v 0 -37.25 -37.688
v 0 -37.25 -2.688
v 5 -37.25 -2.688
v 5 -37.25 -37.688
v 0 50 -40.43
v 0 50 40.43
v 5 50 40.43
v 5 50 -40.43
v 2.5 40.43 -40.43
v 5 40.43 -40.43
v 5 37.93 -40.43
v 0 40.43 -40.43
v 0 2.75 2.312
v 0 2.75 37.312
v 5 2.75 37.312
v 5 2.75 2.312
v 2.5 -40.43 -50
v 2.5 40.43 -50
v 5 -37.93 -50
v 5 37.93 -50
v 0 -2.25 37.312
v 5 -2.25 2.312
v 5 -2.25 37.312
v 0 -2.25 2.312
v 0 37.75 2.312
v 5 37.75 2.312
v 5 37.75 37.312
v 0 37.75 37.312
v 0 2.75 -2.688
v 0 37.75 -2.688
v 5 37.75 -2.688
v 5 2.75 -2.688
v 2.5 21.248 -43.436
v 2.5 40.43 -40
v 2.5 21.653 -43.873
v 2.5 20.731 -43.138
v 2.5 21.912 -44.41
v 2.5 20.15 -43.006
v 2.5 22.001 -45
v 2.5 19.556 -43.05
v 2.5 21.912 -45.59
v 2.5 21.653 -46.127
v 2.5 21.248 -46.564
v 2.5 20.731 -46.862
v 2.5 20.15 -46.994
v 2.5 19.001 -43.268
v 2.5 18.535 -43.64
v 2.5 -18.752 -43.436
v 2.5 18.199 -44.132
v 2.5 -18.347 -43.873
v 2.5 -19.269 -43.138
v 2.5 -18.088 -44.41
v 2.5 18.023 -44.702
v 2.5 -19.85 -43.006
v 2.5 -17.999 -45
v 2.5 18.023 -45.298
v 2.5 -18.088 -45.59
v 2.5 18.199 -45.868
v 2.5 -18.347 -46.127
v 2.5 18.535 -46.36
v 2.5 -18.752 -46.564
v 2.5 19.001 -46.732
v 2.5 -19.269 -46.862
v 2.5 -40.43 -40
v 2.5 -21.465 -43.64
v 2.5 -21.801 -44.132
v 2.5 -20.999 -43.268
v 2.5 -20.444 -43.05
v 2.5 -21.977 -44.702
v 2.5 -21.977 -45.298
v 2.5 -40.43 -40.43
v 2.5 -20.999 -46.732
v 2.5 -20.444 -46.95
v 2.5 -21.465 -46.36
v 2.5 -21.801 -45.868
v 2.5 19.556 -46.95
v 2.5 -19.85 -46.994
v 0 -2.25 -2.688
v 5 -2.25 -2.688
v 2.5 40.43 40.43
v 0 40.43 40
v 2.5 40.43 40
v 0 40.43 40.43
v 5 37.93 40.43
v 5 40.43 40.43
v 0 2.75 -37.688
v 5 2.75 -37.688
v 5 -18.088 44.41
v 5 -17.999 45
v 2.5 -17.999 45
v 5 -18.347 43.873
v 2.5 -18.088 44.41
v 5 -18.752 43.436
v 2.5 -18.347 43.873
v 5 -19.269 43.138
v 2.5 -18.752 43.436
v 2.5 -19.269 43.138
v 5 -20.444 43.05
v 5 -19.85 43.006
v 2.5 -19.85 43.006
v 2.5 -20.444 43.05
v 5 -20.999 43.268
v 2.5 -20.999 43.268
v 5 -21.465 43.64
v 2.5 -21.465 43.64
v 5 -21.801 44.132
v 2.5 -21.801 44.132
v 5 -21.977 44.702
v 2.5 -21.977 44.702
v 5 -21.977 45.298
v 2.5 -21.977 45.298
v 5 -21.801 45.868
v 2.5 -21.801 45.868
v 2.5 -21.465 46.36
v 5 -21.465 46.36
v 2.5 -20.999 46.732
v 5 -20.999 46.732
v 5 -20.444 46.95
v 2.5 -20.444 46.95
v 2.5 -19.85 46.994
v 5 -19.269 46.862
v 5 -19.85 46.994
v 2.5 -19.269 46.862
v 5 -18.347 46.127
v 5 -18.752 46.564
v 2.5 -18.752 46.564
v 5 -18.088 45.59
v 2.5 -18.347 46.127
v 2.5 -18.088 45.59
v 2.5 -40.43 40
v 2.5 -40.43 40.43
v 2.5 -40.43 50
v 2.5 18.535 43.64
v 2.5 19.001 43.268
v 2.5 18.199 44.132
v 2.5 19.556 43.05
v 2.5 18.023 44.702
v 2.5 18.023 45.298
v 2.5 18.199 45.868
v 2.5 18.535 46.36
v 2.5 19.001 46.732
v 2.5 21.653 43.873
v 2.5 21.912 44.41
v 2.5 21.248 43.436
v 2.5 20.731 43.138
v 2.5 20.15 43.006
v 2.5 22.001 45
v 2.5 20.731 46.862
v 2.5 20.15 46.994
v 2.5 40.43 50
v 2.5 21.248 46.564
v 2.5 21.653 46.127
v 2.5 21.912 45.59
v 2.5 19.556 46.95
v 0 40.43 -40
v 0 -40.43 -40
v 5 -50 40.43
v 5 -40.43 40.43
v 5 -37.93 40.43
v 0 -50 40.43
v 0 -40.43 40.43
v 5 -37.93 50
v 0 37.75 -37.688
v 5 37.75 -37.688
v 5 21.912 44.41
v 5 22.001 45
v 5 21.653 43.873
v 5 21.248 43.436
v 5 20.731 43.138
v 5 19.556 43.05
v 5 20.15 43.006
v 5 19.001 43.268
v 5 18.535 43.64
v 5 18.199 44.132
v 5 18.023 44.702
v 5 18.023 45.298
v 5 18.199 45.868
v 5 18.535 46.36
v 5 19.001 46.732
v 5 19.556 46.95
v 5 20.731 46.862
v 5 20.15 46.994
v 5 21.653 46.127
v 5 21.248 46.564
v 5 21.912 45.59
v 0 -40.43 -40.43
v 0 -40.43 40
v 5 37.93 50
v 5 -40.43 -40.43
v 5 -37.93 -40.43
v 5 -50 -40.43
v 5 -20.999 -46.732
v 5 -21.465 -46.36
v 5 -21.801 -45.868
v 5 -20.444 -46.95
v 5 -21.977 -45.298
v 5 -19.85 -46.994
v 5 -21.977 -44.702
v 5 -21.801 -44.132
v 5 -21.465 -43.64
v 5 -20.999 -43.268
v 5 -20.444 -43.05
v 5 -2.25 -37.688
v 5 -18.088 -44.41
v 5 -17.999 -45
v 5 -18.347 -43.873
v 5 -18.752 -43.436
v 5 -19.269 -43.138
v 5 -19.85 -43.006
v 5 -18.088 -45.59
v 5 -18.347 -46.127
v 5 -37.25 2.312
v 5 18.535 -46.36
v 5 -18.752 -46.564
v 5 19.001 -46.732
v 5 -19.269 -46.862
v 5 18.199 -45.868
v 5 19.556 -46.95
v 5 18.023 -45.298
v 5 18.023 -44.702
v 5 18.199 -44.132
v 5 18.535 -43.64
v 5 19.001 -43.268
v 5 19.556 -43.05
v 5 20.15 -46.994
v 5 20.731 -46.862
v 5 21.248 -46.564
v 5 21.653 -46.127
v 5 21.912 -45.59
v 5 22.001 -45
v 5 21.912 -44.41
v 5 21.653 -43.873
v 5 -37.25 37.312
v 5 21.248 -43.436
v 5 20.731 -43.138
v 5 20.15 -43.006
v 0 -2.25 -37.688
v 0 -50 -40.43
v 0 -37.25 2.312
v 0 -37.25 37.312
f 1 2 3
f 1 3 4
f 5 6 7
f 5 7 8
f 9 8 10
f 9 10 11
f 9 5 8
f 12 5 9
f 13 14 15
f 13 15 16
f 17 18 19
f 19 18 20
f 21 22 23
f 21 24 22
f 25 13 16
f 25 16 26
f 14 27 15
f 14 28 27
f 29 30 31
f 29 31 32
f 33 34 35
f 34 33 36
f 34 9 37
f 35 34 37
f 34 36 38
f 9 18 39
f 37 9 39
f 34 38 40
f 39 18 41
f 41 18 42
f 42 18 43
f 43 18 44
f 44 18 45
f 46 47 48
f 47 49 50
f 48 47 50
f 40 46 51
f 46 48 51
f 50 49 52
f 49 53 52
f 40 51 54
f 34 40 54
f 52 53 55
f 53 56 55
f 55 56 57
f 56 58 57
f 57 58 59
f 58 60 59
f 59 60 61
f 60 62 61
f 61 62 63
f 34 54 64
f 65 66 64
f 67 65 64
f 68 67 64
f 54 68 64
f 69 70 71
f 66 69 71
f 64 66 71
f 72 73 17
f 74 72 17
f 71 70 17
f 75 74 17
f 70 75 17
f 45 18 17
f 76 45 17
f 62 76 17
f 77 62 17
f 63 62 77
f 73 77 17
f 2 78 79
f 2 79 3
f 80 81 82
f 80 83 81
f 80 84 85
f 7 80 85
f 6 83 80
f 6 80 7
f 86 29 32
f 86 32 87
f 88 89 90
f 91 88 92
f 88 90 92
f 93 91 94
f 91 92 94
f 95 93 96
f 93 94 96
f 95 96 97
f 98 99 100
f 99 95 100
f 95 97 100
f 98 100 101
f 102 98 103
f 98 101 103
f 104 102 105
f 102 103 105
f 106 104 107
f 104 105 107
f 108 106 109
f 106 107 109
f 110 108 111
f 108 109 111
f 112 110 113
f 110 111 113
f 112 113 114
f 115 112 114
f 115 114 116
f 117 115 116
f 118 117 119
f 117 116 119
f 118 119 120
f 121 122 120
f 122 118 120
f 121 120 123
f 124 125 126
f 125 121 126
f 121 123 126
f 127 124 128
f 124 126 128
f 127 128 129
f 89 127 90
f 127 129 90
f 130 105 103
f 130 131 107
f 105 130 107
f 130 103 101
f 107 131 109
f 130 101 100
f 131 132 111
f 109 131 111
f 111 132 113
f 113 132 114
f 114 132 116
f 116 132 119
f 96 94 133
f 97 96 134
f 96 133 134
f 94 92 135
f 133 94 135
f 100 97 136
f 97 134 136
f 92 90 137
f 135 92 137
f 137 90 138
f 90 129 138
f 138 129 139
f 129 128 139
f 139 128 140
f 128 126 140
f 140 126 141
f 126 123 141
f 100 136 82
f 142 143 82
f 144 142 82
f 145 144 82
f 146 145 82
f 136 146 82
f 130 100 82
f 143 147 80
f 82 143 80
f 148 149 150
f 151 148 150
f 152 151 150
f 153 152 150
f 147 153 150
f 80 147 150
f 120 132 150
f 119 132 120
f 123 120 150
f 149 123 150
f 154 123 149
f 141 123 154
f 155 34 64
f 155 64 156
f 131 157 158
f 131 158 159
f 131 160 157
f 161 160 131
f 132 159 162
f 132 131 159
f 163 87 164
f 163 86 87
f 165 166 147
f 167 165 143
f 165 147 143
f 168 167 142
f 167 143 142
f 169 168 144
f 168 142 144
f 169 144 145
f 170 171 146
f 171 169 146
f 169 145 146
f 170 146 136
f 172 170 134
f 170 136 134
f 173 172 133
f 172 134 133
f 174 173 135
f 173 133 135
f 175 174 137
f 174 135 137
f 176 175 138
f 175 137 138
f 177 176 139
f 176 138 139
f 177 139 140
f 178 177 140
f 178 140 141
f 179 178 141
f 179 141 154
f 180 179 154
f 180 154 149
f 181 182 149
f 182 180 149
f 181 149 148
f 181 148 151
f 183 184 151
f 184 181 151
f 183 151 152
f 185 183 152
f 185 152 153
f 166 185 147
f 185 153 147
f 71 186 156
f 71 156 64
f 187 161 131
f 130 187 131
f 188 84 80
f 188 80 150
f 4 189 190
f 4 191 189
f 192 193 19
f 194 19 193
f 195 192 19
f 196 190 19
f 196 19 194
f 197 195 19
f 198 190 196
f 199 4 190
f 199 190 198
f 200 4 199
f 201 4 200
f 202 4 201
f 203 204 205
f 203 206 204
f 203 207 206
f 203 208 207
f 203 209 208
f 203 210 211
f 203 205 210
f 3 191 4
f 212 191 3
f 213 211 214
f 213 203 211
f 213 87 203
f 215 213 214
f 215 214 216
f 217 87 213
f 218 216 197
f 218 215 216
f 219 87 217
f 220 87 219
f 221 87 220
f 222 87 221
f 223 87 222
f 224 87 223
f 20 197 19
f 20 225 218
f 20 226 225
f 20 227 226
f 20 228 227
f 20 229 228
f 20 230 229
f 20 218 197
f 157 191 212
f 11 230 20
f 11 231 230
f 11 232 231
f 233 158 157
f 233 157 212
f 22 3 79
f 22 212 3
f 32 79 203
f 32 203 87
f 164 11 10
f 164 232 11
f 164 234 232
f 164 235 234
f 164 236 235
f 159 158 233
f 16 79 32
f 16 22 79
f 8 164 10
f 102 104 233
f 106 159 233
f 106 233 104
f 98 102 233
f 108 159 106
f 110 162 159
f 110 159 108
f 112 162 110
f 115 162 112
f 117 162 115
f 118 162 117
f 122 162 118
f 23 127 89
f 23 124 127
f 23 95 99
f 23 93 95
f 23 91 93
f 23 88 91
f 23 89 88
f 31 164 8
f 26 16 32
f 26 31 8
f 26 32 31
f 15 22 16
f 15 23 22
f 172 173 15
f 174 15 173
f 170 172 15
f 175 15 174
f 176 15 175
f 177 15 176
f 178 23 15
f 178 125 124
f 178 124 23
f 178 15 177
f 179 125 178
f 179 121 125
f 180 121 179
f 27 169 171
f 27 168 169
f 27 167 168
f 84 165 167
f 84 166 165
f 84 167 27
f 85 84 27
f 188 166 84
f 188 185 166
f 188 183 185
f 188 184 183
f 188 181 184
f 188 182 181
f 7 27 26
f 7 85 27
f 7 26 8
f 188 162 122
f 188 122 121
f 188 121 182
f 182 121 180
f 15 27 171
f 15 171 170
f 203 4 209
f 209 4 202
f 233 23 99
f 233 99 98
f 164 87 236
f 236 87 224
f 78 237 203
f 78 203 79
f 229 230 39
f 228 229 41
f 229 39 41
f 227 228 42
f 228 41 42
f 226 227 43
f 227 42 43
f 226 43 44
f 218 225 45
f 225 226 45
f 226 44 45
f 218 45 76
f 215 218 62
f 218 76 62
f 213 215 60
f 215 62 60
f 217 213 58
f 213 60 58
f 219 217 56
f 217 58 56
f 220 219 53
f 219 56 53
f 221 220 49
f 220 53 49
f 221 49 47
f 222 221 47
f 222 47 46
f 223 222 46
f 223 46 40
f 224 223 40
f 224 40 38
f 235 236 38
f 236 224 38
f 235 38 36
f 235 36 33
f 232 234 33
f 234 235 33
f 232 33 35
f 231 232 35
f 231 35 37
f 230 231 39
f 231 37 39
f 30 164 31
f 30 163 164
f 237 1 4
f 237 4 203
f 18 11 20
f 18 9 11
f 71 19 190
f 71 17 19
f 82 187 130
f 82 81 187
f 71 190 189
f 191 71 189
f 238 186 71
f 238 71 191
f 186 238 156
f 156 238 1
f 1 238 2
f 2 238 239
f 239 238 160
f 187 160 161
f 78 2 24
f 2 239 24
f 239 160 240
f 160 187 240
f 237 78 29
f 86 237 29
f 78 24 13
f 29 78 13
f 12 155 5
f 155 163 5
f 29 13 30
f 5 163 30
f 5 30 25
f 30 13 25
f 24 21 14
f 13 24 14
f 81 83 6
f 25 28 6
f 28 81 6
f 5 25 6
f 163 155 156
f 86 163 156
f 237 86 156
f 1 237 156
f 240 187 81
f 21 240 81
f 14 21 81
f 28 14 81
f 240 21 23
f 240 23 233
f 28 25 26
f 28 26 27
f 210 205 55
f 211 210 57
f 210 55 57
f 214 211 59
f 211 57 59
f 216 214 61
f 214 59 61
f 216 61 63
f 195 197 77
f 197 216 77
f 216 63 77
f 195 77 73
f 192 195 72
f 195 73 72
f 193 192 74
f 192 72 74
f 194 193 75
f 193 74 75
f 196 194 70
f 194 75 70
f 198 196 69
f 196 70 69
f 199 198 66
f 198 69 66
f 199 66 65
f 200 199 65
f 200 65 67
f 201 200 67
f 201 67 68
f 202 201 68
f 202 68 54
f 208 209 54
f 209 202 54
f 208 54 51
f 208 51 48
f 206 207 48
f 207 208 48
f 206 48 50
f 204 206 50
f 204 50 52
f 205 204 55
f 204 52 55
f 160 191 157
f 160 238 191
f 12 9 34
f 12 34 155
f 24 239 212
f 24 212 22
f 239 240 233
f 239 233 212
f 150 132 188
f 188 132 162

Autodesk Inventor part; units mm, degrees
ref_plane "YZ Plane" through (0, 0, 0) normal (1, 0, 0) x (0, 1, 0)
ref_plane "XZ Plane" through (0, 0, 0) normal (0, 1, 0) x (-1, 0, 0)
ref_plane "XY Plane" through (0, 0, 0) normal (0, 0, 1) x (1, 0, 0)
sketch "Sketch1" plane through (0, 0, 0) normal (1, 0, 0) x (0, 1, 0)
  line L0 (-40.43, 50) -> (40.43, 50)
  line L1 (50, 40.43) -> (50, -40.43)
  line L2 (40.43, -50) -> (-40.43, -50)
  line L3 (-50, -40.43) -> (-50, 40.43)
  line L4 (40.43, 50) -> (40.43, 40.43)
  line L5 (40.43, 40.43) -> (50, 40.43)
  line L6 (-50, 40.43) -> (-40.43, 40.43)
  line L7 (-40.43, 40.43) -> (-40.43, 50)
  line L8 (-40.43, -50) -> (-40.43, -40.43)
  line L9 (-40.43, -40.43) -> (-50, -40.43)
  line L10 (50, -40.43) -> (40.43, -40.43)
  line L11 (40.43, -40.43) -> (40.43, -50)
  line L12 (2.75, 2.3115) -> (37.75, 2.3115)
  line L13 (37.75, 2.3115) -> (37.75, 37.3115)
  line L14 (37.75, 37.3115) -> (2.75, 37.3115)
  line L15 (2.75, 37.3115) -> (2.75, 2.3115)
  line L16 (2.75, -37.6885) -> (37.75, -37.6885)
  line L17 (2.75, -2.6885) -> (2.75, -37.6885)
  line L18 (37.75, -2.6885) -> (2.75, -2.6885)
  line L19 (37.75, -37.6885) -> (37.75, -2.6885)
  line L20 (-37.25, 2.3115) -> (-2.25, 2.3115)
  line L21 (-37.25, 37.3115) -> (-37.25, 2.3115)
  line L22 (-2.25, 37.3115) -> (-37.25, 37.3115)
  line L23 (-2.25, 2.3115) -> (-2.25, 37.3115)
  line L24 (-37.25, -37.6885) -> (-2.25, -37.6885)
  line L25 (-37.25, -2.6885) -> (-37.25, -37.6885)
  line L26 (-2.25, -2.6885) -> (-37.25, -2.6885)
  line L27 (-2.25, -37.6885) -> (-2.25, -2.6885)
  line L28 (40.43, 40.43) -> (50, 40.43)
  line L29 (50, 40.43) -> (50, 50)
  line L30 (50, 50) -> (40.43, 50)
  line L31 (40.43, 50) -> (40.43, 40.43)
  line L32 (40.43, -40.43) -> (50, -40.43)
  line L33 (50, -40.43) -> (50, -50)
  line L34 (50, -50) -> (40.43, -50)
  line L35 (40.43, -50) -> (40.43, -40.43)
  line L36 (-40.43, -40.43) -> (-50, -40.43)
  line L37 (-50, -40.43) -> (-50, -50)
  line L38 (-50, -50) -> (-40.43, -50)
  line L39 (-40.43, -50) -> (-40.43, -40.43)
  line L40 (-40.43, 40.43) -> (-50, 40.43)
  line L41 (-50, 40.43) -> (-50, 50)
  line L42 (-50, 50) -> (-40.43, 50)
  line L43 (-40.43, 50) -> (-40.43, 40.43)
  circle A0 centre (20.0008, 45) radius 2
  circle A1 centre (20.0008, -45) radius 2
  circle A2 centre (-19.9992, 45) radius 2
  circle A3 centre (-19.9992, -45) radius 2
  point P0 (0, 0)
  point P1 (50, 45.215)
  dimension "d7" = 9.57
  dimension "d8" = 9.57
  dimension "d11" = 360
  dimension "d13" = 80.86
  dimension "d14" = 100
  dimension "d15" = 35
  dimension "d16" = 35
  dimension "d19" = 40
  dimension "d22" = 40
  dimension "d25" = 4
  dimension "d26" = 30
  dimension "d27" = 5
  dimension "d30" = 90
  dimension "d33" = 40
  dimension "d36" = 12.25
extrude "Extrusion1" add sketch "Sketch1" along normal blind 5 contours L0 L4 L5 L1 L10 L11 L2 L8 L9 L3 L6 L7
sketch "Sketch2" plane through (0, -40.43, 50) normal (0, 0, 1) x (1, 0, 0)
  line L0 (0, -9.57) -> (0, 0) projected
  line L1 (0, 80.86) -> (5, 80.86) projected
  line L2 (0, 0) -> (2.5, 0)
  line L3 (2.5, 0) -> (2.5, 80.86)
  line L4 (2.5, 80.86) -> (0, 80.86)
  line L5 (0, 80.86) -> (0, 0)
  point P0 (0, 40.43)
extrude "Extrusion2" cut sketch "Sketch2" against normal blind 10
sketch "Sketch3" plane through (0, -40.43, -50) normal (0, 0, -1) x (-1, 0, 0)
  line L0 (-2.5, 80.86) -> (-2.5, 0) projected
  line L1 (0, 0) -> (-2.5, 0)
  line L2 (-2.5, 0) -> (-2.5, 80.86)
  line L3 (-2.5, 80.86) -> (0, 80.86)
  line L4 (0, 80.86) -> (0, 0)
  point P0 (0, 40.43)
extrude "Extrusion3" cut sketch "Sketch3" against normal blind 10
chamfer "Chamfer3" distance 2.5 angle 45 4 edges at (5, -40.43, 45.215) (5, 40.43, 45.215) (5, -40.43, -45.215) (5, 40.43, -45.215)
properties part number "Side Panel"
